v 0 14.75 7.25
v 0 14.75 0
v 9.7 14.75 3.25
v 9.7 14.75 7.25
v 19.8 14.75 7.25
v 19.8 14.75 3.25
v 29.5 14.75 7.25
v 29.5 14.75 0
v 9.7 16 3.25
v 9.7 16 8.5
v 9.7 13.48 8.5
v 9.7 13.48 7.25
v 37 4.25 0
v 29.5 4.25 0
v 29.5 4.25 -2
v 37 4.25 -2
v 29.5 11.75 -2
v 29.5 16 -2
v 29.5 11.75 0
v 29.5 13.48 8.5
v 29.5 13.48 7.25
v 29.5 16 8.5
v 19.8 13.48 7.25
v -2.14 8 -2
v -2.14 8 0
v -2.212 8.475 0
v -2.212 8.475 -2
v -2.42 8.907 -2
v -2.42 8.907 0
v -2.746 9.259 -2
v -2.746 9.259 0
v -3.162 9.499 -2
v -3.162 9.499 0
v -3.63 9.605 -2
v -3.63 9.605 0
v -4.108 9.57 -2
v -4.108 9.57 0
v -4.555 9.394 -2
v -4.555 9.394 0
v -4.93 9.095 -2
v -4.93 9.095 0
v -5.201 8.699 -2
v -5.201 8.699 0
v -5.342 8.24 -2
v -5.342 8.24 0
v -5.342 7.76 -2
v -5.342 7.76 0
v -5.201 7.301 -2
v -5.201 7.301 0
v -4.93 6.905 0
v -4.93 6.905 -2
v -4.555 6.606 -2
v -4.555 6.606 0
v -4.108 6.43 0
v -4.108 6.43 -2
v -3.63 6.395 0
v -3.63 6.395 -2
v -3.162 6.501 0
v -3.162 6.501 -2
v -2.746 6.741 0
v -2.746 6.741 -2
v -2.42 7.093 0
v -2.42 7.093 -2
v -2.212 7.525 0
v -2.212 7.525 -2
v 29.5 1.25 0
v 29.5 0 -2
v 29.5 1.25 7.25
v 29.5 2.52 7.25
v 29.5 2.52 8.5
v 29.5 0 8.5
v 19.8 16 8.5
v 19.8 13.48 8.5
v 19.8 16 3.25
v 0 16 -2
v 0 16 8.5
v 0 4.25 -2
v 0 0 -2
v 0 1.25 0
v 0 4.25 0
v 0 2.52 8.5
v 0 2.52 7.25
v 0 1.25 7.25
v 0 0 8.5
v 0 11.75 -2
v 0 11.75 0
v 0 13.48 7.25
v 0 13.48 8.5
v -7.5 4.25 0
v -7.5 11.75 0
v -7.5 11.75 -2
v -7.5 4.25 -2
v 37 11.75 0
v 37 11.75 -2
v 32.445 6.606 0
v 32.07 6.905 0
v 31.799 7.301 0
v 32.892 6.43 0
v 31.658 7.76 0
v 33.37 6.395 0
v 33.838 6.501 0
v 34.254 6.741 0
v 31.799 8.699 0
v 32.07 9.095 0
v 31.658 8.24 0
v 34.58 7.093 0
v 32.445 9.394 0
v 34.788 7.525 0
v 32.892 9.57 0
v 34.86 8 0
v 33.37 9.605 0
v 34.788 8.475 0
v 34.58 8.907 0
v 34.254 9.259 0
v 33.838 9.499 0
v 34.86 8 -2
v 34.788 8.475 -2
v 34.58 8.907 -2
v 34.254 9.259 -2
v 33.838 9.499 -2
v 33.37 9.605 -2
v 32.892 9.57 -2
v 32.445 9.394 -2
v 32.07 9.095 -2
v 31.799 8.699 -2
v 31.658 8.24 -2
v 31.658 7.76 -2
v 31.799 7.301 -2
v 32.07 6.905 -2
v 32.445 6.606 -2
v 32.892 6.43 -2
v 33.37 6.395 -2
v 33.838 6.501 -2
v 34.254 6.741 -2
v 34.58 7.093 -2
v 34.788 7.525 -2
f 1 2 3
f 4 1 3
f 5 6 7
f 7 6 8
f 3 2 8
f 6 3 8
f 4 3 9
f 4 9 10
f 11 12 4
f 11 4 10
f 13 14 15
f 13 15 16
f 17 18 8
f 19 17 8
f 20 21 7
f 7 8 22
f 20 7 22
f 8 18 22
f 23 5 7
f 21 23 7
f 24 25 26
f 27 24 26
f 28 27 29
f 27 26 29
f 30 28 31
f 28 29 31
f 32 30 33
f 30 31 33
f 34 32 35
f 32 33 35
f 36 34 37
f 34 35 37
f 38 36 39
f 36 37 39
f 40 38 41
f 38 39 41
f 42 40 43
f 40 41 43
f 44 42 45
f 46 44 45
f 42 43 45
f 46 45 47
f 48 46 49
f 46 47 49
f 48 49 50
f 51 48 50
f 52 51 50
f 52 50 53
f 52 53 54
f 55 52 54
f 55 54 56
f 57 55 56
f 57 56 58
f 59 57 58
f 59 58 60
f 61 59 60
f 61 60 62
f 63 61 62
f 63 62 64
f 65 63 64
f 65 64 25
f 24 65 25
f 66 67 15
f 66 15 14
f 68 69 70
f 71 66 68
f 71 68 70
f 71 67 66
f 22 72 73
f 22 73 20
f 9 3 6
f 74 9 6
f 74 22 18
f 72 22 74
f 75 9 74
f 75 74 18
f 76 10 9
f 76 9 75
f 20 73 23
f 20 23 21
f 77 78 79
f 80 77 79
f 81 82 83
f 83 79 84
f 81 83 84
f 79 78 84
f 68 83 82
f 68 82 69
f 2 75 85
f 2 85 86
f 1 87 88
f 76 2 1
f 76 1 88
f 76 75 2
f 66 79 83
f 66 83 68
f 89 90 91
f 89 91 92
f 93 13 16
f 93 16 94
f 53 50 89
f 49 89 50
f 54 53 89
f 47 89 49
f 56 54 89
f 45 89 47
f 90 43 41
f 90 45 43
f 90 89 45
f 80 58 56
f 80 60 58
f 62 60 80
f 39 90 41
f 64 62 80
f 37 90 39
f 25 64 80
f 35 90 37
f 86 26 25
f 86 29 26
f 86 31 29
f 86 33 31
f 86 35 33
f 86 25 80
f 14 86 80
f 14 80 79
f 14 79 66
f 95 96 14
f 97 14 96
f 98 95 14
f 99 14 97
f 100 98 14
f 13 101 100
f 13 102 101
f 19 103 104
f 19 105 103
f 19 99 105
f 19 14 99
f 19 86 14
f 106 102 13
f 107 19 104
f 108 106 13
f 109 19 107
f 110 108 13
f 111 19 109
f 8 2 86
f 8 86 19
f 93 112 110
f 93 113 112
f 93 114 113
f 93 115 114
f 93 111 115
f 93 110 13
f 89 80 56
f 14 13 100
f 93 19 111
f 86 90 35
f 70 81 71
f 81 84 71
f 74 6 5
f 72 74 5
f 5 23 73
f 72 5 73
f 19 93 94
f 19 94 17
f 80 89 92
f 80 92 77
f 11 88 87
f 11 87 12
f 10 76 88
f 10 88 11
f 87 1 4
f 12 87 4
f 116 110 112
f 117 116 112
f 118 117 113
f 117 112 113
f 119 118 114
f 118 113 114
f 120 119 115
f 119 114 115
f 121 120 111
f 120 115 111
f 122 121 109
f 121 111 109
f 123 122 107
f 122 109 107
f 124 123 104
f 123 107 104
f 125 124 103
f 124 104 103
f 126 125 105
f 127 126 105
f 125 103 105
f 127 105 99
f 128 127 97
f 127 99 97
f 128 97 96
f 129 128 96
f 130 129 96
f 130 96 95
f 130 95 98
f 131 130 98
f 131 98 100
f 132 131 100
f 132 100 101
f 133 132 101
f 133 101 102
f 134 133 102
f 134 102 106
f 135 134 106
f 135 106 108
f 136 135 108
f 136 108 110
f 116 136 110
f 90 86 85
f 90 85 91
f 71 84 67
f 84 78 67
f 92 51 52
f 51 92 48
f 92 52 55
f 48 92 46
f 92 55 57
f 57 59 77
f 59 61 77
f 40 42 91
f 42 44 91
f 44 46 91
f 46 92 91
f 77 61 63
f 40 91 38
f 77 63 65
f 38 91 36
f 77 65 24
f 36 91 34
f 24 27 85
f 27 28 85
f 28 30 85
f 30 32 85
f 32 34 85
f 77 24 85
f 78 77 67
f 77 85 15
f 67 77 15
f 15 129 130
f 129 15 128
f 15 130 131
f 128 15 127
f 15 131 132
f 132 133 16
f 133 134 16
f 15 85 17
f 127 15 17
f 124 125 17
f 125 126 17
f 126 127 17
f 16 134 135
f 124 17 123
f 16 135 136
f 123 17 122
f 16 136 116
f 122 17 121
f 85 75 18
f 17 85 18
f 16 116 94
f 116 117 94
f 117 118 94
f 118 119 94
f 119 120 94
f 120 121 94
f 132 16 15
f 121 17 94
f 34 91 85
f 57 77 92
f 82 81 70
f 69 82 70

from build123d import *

# Parameters (mm, degrees)
BOSS_EXTRUDE2_DEPTH = 2
SKETCH3_R           = 1.61
CUT_EXTRUDE1_DEPTH  = 7.62
SKETCH6_W           = 29.5
SKETCH6_H           = 1.25
BOSS_EXTRUDE4_DEPTH = 8.5
SKETCH7_W           = 29.5
SKETCH7_H           = 1.25
BOSS_EXTRUDE5_DEPTH = 1.27
SKETCH10_W          = 10.1
SKETCH10_H          = 5.25
CUT_EXTRUDE2_DEPTH  = 2


with BuildPart() as part:
    # Sketch2 → Boss-Extrude2 (new body)
    with BuildSketch(Plane.XY):
        Polygon((0, 4.25), (0, 0), (29.5, 0), (29.5, 4.25), (37, 4.25), (37, 11.75), (29.5, 11.75), (29.5, 16), (0, 16), (0, 11.75), (-7.5, 11.75), (-7.5, 4.25), align=None)
    extrude(amount=-BOSS_EXTRUDE2_DEPTH)

    # Sketch3 → Cut-Extrude1 (cut)
    with BuildSketch(Plane.XY):
        with Locations((33.25, 8)):
            Circle(SKETCH3_R)
        with Locations((-3.75, 8)):
            Circle(SKETCH3_R)
    extrude(amount=-CUT_EXTRUDE1_DEPTH, mode=Mode.SUBTRACT)

    # Sketch6 → Boss-Extrude4 (add)
    with BuildSketch(Plane.XY):
        with Locations((14.75, 0.625)):
            Rectangle(SKETCH6_W, SKETCH6_H)
        with Locations((14.75, 15.375)):
            Rectangle(SKETCH6_W, SKETCH6_H)
    extrude(amount=BOSS_EXTRUDE4_DEPTH)

    # Sketch7 → Boss-Extrude5 (add)
    with BuildSketch(Plane.XZ.offset(-14.75)):
        with Locations((14.75, 7.875)):
            Rectangle(SKETCH7_W, SKETCH7_H)
    boss_extrude5 = extrude(amount=BOSS_EXTRUDE5_DEPTH)

    # Mirror1: Boss-Extrude5 across plane
    add(boss_extrude5.mirror(Plane.ZX.offset(8)))

    # Sketch10 → Cut-Extrude2 (cut, symmetric)
    with BuildSketch(Plane.XZ.offset(-14.75)):
        with Locations((14.75, 5.875)):
            Rectangle(SKETCH10_W, SKETCH10_H)
    extrude(amount=CUT_EXTRUDE2_DEPTH, both=True, mode=Mode.SUBTRACT)


solid = part.part
